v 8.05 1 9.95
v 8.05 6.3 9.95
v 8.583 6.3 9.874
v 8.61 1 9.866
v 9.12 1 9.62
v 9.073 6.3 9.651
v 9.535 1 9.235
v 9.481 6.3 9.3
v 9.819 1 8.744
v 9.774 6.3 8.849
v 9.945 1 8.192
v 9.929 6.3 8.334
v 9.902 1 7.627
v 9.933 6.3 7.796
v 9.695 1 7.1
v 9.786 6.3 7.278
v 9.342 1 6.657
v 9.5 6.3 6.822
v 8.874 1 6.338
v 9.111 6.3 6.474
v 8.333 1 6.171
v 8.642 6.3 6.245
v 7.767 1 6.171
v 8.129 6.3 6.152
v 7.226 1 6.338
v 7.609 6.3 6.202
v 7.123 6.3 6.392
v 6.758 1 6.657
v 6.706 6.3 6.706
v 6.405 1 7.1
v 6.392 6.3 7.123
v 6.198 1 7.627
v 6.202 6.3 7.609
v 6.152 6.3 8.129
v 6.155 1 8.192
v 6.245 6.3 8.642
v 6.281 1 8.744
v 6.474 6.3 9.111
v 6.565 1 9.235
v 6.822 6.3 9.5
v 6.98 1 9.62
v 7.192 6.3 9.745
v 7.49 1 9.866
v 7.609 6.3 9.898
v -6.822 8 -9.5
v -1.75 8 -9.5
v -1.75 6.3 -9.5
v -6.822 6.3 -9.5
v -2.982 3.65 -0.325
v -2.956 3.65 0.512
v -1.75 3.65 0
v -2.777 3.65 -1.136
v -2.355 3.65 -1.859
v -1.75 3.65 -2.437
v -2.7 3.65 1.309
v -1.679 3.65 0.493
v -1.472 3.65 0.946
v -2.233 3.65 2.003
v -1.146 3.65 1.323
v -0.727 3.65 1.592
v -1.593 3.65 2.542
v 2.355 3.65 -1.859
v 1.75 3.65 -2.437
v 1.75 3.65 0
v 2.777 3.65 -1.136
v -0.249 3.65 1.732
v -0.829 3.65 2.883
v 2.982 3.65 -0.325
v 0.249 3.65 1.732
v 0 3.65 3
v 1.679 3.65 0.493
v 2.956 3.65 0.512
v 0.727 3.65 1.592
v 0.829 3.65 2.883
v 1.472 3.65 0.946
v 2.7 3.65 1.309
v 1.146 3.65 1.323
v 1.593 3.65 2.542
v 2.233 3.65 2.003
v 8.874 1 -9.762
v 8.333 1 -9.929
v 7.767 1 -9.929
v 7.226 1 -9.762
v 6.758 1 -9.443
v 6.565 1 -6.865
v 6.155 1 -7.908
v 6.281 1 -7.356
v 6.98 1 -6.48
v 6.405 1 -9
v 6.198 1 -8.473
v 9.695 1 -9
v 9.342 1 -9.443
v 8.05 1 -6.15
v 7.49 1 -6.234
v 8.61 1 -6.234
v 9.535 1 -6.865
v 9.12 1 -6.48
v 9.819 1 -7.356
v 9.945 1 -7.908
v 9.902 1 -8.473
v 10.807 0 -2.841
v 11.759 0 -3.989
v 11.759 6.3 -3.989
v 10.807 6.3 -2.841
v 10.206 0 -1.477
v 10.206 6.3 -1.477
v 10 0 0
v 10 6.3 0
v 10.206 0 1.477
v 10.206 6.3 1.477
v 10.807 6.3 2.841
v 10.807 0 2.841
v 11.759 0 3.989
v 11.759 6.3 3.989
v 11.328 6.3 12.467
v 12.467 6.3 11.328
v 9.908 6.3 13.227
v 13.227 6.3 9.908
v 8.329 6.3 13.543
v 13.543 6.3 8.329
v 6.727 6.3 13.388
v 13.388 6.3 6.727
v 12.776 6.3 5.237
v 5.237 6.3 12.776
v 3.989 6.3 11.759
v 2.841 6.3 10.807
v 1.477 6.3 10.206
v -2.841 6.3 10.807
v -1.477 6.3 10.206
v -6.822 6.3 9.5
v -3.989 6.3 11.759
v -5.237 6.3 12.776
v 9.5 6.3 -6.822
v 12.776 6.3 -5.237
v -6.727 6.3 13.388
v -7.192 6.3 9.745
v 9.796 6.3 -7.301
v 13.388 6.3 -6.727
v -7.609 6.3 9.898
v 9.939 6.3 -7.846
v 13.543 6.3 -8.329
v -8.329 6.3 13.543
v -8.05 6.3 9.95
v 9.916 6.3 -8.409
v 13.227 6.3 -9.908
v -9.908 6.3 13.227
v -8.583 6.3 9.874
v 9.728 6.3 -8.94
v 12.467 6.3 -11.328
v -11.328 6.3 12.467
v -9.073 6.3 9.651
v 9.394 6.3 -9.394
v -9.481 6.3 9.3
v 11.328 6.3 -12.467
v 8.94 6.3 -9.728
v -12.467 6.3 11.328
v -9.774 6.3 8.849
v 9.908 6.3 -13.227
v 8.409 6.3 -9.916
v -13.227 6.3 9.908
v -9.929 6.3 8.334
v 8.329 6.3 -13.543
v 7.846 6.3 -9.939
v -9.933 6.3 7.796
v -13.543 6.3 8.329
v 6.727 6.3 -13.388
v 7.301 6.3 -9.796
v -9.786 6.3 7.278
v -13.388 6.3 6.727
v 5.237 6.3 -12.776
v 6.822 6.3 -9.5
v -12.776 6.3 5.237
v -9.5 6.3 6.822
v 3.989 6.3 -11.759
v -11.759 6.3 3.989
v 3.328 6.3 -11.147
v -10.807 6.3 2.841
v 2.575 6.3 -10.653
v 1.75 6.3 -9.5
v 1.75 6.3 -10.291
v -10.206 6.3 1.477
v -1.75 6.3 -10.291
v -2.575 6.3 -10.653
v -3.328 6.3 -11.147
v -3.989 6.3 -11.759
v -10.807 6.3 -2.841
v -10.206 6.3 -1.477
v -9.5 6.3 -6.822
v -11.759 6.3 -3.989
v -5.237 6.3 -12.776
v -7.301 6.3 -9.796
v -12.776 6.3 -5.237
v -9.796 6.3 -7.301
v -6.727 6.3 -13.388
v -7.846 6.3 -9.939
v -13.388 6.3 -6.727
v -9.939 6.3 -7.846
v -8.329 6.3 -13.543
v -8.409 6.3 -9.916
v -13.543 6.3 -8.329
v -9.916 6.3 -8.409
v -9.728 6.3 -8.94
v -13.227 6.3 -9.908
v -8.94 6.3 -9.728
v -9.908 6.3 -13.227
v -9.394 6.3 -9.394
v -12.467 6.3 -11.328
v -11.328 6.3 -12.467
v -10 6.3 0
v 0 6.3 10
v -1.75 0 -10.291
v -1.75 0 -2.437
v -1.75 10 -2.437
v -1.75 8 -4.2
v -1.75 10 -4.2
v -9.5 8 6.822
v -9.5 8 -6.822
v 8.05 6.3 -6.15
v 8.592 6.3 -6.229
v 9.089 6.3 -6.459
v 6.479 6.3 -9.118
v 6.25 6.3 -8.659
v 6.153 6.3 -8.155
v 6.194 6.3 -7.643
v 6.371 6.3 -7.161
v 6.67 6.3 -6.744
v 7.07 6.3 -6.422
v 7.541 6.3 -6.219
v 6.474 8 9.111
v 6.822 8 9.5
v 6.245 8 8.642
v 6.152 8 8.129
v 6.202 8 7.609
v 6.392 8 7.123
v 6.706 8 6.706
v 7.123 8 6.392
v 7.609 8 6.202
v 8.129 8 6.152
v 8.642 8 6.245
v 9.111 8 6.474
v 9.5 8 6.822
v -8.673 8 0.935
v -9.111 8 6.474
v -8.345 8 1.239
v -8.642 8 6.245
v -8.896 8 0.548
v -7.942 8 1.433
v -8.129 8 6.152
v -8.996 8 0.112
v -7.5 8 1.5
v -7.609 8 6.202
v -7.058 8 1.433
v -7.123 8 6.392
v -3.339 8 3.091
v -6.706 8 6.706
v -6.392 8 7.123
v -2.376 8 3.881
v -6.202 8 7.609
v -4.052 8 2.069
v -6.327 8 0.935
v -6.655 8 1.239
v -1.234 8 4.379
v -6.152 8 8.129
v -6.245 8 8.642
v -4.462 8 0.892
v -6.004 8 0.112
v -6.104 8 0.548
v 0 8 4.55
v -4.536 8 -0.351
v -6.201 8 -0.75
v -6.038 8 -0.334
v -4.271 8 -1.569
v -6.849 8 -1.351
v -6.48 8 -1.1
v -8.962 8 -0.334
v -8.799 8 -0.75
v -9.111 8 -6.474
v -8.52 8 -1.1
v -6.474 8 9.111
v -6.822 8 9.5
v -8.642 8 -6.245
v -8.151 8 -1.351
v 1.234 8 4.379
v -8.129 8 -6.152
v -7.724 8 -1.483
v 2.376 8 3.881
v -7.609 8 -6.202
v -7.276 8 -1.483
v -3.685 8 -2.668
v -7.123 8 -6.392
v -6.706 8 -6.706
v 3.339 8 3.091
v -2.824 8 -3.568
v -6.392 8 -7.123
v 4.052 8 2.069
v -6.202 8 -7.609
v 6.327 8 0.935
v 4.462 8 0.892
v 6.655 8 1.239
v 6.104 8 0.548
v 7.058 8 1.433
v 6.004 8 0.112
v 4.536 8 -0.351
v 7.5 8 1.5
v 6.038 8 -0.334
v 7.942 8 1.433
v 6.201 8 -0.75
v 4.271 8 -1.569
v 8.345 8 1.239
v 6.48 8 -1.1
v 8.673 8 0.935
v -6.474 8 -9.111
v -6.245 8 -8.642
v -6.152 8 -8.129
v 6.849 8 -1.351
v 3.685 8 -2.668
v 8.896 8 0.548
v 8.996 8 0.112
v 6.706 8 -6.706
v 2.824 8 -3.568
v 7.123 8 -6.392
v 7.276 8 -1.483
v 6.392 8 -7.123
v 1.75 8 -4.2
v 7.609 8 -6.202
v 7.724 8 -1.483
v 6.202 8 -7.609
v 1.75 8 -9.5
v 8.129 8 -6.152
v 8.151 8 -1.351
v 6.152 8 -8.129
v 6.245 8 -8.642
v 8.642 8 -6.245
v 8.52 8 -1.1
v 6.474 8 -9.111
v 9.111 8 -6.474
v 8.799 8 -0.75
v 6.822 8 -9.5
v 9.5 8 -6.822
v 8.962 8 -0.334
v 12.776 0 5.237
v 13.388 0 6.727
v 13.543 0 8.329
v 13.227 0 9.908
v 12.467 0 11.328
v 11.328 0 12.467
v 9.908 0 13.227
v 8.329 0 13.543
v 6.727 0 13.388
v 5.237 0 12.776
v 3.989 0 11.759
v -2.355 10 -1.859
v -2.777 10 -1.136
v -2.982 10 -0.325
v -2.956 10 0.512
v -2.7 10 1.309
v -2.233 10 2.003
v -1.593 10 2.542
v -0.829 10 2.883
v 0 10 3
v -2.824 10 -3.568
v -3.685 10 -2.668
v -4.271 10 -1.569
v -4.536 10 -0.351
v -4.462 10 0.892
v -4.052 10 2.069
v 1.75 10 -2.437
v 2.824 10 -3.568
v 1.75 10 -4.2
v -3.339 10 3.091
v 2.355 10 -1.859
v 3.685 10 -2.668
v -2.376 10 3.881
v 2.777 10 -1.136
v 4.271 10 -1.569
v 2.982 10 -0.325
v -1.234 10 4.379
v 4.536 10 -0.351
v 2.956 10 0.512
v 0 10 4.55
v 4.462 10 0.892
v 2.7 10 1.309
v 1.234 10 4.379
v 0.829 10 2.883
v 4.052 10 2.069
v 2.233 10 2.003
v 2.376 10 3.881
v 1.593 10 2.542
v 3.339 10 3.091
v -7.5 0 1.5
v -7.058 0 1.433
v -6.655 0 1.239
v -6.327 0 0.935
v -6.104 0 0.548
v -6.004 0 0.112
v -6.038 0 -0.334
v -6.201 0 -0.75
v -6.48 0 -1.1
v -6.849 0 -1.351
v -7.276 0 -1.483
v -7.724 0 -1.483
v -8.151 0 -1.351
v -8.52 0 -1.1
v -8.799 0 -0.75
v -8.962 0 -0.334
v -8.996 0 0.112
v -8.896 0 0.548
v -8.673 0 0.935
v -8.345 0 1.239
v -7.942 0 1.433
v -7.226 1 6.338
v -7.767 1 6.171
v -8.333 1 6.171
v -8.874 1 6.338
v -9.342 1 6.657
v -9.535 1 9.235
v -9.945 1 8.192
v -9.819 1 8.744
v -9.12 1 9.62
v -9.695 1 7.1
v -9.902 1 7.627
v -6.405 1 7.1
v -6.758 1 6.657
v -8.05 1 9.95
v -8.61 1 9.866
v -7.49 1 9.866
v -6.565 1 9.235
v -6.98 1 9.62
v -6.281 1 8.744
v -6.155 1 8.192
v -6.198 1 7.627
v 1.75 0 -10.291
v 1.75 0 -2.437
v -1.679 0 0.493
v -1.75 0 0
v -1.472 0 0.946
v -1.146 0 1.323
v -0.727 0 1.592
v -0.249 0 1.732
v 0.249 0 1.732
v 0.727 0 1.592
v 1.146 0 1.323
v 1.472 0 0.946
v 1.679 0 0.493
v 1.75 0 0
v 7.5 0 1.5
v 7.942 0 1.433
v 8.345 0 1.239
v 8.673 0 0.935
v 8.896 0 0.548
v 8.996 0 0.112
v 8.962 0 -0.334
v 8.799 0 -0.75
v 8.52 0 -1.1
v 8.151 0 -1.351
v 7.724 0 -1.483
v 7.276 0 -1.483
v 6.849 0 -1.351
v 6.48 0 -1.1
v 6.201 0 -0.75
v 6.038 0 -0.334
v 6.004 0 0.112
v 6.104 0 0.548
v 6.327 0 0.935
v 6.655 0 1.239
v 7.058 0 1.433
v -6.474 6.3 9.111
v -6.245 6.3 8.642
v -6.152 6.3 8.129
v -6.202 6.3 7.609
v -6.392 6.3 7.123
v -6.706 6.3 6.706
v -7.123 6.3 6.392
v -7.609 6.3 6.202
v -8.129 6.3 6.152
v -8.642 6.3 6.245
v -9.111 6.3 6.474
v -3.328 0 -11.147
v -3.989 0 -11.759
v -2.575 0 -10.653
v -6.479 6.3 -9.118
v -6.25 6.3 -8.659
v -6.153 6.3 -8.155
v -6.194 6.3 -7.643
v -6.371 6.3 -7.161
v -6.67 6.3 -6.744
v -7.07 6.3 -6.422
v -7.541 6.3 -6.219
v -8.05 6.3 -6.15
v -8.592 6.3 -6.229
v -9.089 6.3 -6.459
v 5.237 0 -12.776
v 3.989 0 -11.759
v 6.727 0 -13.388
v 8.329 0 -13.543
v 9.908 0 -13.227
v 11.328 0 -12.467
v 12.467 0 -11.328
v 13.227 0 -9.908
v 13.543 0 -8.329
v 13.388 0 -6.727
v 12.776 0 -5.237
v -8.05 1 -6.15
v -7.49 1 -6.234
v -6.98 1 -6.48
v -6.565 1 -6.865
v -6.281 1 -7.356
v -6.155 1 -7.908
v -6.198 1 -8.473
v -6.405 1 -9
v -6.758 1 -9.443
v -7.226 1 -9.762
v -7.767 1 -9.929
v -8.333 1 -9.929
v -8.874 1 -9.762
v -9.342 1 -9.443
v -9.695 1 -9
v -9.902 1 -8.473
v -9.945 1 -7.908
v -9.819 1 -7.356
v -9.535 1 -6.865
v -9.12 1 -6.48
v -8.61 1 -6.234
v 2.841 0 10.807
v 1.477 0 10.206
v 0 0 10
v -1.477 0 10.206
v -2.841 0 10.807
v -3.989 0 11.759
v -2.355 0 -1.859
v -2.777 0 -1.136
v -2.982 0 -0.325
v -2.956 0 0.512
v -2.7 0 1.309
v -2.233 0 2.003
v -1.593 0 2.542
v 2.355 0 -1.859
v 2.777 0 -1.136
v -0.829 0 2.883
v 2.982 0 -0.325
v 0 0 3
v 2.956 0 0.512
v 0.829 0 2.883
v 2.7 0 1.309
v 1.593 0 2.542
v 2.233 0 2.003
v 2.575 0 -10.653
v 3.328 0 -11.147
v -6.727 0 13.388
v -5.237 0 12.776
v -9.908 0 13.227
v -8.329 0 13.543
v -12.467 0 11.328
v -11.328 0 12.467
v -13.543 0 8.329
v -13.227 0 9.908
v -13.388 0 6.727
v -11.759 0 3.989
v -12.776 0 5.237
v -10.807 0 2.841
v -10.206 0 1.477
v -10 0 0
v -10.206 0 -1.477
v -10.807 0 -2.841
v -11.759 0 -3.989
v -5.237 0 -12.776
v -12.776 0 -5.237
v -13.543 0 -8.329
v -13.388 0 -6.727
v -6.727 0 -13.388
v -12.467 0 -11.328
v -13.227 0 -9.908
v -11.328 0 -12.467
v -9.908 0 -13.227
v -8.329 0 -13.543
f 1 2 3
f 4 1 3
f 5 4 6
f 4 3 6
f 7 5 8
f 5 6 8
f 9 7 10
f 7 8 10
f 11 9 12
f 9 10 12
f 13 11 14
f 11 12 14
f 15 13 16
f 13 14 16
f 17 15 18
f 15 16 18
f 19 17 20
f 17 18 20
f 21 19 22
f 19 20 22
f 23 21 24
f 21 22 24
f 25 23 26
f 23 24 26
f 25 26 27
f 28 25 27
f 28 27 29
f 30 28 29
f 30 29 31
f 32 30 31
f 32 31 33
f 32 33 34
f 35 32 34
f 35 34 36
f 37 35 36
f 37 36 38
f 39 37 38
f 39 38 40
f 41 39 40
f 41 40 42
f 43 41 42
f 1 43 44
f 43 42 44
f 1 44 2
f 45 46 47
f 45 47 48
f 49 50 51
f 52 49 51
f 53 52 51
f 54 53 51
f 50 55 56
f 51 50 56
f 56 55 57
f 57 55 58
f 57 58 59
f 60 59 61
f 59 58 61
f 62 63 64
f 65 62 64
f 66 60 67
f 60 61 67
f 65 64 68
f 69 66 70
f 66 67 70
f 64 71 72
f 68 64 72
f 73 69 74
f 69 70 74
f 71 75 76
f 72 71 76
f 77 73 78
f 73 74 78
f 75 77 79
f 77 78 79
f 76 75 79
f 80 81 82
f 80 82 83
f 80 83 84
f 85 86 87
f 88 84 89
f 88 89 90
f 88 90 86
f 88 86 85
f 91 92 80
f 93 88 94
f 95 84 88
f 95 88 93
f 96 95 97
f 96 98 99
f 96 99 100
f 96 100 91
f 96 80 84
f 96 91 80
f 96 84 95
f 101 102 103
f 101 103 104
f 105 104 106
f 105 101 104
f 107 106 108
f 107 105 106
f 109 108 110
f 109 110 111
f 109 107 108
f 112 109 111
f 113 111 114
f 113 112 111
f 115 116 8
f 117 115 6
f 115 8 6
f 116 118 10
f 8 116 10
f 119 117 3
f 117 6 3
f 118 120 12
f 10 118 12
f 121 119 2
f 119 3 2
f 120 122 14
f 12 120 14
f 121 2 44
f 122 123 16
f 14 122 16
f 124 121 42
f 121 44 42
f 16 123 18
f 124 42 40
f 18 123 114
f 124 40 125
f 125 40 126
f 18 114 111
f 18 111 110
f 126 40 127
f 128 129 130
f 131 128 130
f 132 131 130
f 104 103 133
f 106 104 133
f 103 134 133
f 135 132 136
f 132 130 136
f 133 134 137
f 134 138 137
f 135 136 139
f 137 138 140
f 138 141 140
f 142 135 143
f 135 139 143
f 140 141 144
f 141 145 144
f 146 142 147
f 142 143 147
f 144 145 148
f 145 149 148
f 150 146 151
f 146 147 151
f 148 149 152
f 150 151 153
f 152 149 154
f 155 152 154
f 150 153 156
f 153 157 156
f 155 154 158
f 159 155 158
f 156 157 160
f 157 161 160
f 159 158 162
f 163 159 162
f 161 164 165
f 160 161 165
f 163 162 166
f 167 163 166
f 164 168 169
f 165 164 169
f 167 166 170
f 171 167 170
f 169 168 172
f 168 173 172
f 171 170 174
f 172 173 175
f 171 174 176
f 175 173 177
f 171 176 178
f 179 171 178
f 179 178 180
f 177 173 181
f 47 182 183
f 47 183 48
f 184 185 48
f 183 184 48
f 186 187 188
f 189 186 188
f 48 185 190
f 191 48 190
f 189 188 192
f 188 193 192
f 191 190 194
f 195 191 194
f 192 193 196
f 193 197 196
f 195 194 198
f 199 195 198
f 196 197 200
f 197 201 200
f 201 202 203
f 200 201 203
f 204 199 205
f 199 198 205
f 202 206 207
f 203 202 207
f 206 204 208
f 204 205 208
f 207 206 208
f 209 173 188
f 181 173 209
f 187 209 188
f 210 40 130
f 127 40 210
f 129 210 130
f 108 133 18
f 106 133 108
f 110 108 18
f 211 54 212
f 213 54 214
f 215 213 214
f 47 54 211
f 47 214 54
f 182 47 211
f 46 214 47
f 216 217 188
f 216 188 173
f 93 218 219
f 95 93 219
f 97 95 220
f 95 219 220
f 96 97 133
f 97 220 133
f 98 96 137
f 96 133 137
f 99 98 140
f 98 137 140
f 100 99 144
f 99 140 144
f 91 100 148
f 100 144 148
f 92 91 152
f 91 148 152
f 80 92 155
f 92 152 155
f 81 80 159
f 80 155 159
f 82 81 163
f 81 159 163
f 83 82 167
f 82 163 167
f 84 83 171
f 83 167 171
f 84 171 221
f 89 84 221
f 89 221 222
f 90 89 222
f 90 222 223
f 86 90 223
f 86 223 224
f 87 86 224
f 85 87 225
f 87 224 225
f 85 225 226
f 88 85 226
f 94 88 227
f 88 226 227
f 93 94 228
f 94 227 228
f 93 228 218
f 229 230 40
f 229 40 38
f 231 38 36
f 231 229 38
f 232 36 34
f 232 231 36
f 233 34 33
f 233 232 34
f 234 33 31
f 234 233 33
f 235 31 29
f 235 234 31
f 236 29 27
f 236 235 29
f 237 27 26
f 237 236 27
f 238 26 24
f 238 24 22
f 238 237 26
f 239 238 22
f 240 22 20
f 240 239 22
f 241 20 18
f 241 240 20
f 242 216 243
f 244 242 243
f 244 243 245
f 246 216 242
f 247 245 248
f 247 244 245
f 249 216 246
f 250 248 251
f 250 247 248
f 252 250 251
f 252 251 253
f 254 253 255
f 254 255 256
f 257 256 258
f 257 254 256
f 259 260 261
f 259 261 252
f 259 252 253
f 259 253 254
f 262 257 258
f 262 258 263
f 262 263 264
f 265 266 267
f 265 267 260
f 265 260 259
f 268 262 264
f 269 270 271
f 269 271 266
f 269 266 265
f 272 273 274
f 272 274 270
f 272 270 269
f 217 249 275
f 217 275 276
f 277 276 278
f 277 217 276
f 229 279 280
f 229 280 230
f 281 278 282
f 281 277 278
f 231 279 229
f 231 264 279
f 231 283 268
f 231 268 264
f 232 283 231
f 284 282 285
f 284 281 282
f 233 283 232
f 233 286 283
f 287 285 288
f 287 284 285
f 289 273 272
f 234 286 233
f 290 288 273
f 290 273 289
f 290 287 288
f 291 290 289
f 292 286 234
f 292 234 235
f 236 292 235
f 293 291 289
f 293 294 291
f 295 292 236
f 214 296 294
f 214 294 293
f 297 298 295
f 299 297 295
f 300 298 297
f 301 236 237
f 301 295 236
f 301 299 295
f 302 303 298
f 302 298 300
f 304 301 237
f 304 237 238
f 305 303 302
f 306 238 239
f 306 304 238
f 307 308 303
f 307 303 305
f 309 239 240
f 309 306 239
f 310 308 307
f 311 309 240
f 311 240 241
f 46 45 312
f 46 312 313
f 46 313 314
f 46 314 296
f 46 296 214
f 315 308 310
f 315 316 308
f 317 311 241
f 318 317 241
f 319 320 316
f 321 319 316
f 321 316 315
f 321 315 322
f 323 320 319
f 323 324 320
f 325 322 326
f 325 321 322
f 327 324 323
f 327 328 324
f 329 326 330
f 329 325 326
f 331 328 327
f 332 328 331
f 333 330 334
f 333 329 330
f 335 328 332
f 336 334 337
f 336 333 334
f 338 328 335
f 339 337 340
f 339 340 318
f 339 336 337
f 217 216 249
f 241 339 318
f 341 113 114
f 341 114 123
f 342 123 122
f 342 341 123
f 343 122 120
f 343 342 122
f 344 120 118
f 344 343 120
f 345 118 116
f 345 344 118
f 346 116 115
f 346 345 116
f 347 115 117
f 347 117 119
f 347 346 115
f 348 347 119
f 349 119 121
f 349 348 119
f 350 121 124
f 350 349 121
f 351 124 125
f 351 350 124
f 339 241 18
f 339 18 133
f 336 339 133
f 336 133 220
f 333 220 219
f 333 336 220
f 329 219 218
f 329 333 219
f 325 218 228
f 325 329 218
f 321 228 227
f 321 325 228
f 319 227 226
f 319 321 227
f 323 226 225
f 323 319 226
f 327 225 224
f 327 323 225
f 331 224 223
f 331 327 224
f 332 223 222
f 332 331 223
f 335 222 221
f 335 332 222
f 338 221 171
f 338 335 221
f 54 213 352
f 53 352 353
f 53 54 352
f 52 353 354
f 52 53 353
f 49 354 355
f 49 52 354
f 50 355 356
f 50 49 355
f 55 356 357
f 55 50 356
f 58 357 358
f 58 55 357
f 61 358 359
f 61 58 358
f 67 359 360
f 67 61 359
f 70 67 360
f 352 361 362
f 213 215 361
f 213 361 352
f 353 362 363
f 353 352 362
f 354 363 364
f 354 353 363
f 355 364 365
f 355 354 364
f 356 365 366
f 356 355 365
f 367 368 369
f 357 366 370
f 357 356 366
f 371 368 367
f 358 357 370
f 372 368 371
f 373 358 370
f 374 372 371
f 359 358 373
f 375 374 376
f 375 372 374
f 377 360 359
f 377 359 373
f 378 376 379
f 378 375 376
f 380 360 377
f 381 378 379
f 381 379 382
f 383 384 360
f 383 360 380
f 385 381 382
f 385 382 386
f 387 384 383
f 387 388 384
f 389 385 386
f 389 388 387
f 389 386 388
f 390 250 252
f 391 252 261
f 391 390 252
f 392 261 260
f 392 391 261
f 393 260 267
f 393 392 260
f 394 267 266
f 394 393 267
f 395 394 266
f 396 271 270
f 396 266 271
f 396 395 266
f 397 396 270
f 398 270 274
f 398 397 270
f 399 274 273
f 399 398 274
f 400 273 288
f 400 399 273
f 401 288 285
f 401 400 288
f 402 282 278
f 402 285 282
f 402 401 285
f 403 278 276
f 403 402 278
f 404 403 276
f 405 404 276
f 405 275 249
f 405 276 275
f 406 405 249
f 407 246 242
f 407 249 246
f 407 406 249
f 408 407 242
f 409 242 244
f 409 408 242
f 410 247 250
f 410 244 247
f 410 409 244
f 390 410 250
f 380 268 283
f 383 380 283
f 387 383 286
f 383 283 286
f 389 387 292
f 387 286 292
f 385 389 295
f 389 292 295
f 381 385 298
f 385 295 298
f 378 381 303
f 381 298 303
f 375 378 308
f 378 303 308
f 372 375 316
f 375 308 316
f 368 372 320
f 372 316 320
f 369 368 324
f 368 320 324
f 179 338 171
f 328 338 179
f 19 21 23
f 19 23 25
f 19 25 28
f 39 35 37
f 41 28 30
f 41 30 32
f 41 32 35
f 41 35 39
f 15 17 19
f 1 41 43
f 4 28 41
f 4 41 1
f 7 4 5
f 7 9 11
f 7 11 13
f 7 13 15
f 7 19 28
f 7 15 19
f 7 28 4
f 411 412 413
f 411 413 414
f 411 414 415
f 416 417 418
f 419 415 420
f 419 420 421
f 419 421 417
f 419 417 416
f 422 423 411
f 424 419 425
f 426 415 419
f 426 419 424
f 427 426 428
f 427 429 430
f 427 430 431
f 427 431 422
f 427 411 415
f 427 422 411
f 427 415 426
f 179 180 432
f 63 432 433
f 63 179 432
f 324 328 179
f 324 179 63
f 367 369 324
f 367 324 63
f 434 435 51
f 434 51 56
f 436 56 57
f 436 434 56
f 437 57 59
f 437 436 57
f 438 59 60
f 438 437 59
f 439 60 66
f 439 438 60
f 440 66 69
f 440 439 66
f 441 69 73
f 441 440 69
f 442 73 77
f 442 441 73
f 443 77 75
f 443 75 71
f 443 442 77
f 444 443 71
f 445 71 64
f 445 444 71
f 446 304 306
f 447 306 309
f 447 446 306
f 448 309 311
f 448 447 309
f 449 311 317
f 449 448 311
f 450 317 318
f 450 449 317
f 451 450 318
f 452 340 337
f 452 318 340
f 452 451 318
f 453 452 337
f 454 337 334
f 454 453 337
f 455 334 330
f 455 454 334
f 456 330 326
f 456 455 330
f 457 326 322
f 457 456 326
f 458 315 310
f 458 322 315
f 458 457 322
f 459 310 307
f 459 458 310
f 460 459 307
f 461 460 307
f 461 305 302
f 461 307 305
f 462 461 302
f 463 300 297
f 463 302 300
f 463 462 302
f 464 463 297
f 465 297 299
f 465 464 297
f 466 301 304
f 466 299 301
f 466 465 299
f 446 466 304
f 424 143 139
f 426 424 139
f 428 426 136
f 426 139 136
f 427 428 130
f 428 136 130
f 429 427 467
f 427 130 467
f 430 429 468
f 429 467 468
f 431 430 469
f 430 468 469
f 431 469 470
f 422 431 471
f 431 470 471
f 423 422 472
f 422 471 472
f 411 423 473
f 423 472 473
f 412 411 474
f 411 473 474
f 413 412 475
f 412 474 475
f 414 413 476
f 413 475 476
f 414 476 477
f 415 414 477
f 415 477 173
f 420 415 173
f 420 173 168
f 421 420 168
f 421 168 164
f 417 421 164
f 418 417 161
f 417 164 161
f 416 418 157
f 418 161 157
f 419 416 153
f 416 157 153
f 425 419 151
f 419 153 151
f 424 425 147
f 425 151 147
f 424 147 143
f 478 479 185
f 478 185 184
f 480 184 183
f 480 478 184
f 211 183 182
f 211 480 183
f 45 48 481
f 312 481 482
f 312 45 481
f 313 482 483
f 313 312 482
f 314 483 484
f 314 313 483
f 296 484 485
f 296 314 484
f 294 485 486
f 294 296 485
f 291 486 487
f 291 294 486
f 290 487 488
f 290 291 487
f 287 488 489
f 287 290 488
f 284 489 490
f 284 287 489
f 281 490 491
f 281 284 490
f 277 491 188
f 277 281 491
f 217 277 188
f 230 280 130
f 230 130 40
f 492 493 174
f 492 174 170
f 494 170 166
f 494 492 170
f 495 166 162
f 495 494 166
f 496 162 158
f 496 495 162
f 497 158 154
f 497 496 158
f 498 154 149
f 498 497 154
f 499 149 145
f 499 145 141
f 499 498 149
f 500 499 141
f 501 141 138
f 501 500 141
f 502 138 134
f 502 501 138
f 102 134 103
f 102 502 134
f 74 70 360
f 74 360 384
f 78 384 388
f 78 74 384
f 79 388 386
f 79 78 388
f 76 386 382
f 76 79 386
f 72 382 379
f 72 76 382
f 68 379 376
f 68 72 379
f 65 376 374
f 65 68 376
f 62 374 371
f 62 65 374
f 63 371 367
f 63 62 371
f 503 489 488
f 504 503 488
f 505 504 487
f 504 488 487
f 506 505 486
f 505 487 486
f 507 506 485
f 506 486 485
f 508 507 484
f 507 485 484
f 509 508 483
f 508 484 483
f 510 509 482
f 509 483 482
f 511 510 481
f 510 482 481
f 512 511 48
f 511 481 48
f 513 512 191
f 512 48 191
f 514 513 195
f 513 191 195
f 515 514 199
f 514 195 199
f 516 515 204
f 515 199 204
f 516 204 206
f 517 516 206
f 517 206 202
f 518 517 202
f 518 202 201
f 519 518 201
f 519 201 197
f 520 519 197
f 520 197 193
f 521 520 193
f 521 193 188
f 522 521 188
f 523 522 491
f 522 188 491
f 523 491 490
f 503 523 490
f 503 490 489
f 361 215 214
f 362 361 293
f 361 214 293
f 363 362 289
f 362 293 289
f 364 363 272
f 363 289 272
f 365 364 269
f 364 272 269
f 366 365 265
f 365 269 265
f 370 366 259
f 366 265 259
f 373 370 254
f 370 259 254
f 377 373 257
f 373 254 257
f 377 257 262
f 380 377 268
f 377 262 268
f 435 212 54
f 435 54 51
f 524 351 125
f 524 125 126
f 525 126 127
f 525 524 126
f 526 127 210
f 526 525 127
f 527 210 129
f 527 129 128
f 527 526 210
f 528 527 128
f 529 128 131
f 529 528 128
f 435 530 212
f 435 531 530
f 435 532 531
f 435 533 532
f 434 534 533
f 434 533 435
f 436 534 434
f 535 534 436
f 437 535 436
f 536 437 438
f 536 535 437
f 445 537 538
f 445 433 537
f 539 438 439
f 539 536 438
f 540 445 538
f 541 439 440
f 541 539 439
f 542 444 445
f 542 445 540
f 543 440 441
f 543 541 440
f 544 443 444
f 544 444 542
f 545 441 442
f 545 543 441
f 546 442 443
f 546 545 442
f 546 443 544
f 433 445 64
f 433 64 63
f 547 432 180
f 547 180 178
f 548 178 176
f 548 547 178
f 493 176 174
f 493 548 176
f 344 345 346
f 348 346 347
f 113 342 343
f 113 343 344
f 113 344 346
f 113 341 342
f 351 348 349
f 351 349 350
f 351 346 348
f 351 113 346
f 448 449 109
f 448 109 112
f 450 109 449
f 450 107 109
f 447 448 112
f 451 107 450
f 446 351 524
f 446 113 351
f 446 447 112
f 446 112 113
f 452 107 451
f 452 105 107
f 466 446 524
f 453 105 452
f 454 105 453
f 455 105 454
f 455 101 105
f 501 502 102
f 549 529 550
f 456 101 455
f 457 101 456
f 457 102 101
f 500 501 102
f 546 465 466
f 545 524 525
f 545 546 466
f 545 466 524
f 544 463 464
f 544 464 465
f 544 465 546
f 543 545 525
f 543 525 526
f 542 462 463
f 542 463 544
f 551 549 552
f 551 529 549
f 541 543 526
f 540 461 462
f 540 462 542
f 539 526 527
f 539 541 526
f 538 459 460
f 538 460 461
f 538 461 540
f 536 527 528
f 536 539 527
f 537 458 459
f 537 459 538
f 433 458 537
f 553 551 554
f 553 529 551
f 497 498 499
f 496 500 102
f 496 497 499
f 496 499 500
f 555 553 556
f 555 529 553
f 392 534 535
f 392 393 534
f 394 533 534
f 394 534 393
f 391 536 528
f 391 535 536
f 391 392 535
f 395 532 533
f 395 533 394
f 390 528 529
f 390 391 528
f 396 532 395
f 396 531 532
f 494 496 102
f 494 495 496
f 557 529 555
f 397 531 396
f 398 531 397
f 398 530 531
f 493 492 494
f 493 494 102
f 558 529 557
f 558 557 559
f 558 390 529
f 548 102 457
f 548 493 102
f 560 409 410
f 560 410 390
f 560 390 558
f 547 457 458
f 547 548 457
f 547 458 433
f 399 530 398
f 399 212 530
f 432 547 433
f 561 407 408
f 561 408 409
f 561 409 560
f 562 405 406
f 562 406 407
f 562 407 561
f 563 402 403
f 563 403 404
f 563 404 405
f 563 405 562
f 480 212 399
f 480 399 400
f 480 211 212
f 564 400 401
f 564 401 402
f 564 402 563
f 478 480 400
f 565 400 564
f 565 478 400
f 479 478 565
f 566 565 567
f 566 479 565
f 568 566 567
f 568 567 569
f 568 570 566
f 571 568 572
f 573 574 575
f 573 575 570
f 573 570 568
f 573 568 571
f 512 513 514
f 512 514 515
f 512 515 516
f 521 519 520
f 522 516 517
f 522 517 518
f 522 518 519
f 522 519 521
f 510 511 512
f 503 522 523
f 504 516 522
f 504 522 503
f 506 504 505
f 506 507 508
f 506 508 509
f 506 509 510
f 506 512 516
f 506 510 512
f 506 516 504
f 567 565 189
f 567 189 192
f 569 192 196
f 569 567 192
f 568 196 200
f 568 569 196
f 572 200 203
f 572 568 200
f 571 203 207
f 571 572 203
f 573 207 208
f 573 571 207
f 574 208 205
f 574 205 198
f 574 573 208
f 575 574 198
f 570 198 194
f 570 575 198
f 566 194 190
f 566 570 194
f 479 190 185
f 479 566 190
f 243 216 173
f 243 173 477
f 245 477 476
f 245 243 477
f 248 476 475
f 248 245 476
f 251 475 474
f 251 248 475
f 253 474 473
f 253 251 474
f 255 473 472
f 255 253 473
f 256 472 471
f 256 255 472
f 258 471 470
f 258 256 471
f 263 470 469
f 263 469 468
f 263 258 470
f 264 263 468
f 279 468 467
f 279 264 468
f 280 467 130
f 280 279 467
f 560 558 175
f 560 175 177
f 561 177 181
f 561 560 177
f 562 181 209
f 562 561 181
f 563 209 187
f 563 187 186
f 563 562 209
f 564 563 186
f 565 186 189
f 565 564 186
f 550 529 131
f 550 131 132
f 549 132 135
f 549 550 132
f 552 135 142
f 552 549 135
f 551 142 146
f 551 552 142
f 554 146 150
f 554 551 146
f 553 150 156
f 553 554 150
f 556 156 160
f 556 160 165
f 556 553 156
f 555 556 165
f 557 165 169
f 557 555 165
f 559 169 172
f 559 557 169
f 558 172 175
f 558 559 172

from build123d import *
from build123d.topology import SkipClean

# Parameters (mm, degrees)
SKETCH1_R           = 1.5
BOSS_EXTRUDE1_DEPTH = 6.3
SKETCH3_R           = 1.9
CUT_EXTRUDE3_DEPTH  = 5.3
BOSS_EXTRUDE2_START = 1.7
BOSS_EXTRUDE2_DEPTH = 1.7
SKETCH7_R           = 4.55
BOSS_EXTRUDE3_DEPTH = 2
SKETCH6_R           = 1.5
SKETCH6_R_2         = 3
CUT_EXTRUDE4_DEPTH  = 22.614925399
CUT_EXTRUDE5_DEPTH  = 22.614925399
BOSS_EXTRUDE4_DEPTH = 3.65


with BuildPart() as part:
    # Sketch1 → Boss-Extrude1 (new body)
    with BuildSketch(Plane(origin=(0, 0, 0), x_dir=(1, 0, 0), z_dir=(0, 1, 0))):
        with BuildLine():
            ThreePointArc((-3.988860539, -11.759062722), (-11.939087297, -11.939087297), (-11.759062722, -3.988860539))
            ThreePointArc((-11.759062722, -3.988860539), (-10, 0), (-11.759062722, 3.988860539))
            ThreePointArc((-11.759062722, 3.988860539), (-11.939087297, 11.939087297), (-3.988860539, 11.759062722))
            ThreePointArc((-3.988860539, 11.759062722), (0, 10), (3.988860539, 11.759062722))
            ThreePointArc((3.988860539, 11.759062722), (11.939087297, 11.939087297), (11.759062722, 3.988860539))
            ThreePointArc((11.759062722, 3.988860539), (10, 0), (11.759062722, -3.988860539))
            ThreePointArc((11.759062722, -3.988860539), (11.939087297, -11.939087297), (3.988860539, -11.759062722))
            ThreePointArc((3.988860539, -11.759062722), (0, -10), (-3.988860539, -11.759062722))
        make_face()
        with Locations(Location((-7.5, 0, 0), (0, 0, 270))):
            Circle(SKETCH1_R, mode=Mode.SUBTRACT)
        with Locations(Location((7.5, 0, 0), (0, 0, 270))):
            Circle(SKETCH1_R, mode=Mode.SUBTRACT)
    extrude(amount=BOSS_EXTRUDE1_DEPTH)

    # Sketch3 → Cut-Extrude3 (cut)
    with BuildSketch(Plane(origin=(0, 6.3, 0), x_dir=(1, 0, 0), z_dir=(0, 1, 0))):
        with Locations(Location((-8.05, 8.05, 0), (0, 0, 270))):
            Circle(SKETCH3_R)
        with Locations(Location((8.05, 8.05, 0), (0, 0, 270))):
            Circle(SKETCH3_R)
        with Locations(Location((8.05, -8.05, 0), (0, 0, 270))):
            Circle(SKETCH3_R)
        with Locations(Location((-8.05, -8.05, 0), (0, 0, 270))):
            Circle(SKETCH3_R)
    extrude(amount=-CUT_EXTRUDE3_DEPTH, mode=Mode.SUBTRACT)

    # Sketch5 → Boss-Extrude2 (add)
    with BuildSketch(Plane(origin=(0, 6.3, 0), x_dir=(1, 0, 0), z_dir=(0, 1, 0)).offset(BOSS_EXTRUDE2_START)):
        with BuildLine():
            Line((-9.5, 6.822197084), (-9.5, -6.822197084))
            ThreePointArc((-9.5, -6.822197084), (-6.706497116, -6.706497116), (-6.822197084, -9.5))
            Line((-6.822197084, -9.5), (6.822197084, -9.5))
            ThreePointArc((6.822197084, -9.5), (6.706497116, -6.706497116), (9.5, -6.822197084))
            Line((9.5, -6.822197084), (9.5, 6.822197084))
            ThreePointArc((9.5, 6.822197084), (6.706497116, 6.706497116), (6.822197084, 9.5))
            Line((6.822197084, 9.5), (-6.822197084, 9.5))
            ThreePointArc((-6.822197084, 9.5), (-6.706497116, 6.706497116), (-9.5, 6.822197084))
        make_face()
    extrude(amount=-BOSS_EXTRUDE2_DEPTH)

    # Sketch7 → Boss-Extrude3 (add)
    with BuildSketch(Plane(origin=(0, 8, 0), x_dir=(1, 0, 0), z_dir=(0, 1, 0))):
        with Locations(Location((0, 0, 0), (0, 0, 270))):
            Circle(SKETCH7_R)
    extrude(amount=BOSS_EXTRUDE3_DEPTH)

    # Sketch6 → Cut-Extrude4 (cut, through all)
    with BuildSketch(Plane(origin=(0, 0, 0), x_dir=(1, 0, 0), z_dir=(0, 1, 0))):
        with Locations(Location((-7.5, 0, 0), (0, 0, 270))):
            Circle(SKETCH6_R)
        with Locations(Location((0, 0, 0), (0, 0, 270))):
            Circle(SKETCH6_R_2)
        with Locations(Location((7.5, 0, 0), (0, 0, 270))):
            Circle(SKETCH6_R)
    extrude(amount=CUT_EXTRUDE4_DEPTH, mode=Mode.SUBTRACT)

    # Sketch8 → Cut-Extrude5 (cut, through all)
    with SkipClean():  # the faces are left unmerged after this step: merging them gives an invalid solid
        with BuildSketch(Plane(origin=(0, 10, 0), x_dir=(1, 0, 0), z_dir=(0, 1, 0))):
            with BuildLine():
                Line((-1.75, 0), (-1.75, 12))
                ThreePointArc((-1.75, 12), (0, 13.75), (1.75, 12))
                Line((1.75, 12), (1.75, 0))
                ThreePointArc((1.75, 0), (0, -1.75), (-1.75, 0))
            make_face()
        extrude(amount=-CUT_EXTRUDE5_DEPTH, mode=Mode.SUBTRACT)

    # Sketch9 → Boss-Extrude4 (add)
    with SkipClean():  # the faces are left unmerged after this step: merging them gives an invalid solid
        with BuildSketch(Plane.XZ):
            with BuildLine():
                Line((-1.75, -2.436698586), (-1.75, 0))
                ThreePointArc((-1.75, 0), (0, 1.75), (1.75, 0))
                Line((1.75, 0), (1.75, -2.436698586))
                ThreePointArc((1.75, -2.436698586), (0, 3), (-1.75, -2.436698586))
            make_face()
        extrude(amount=-BOSS_EXTRUDE4_DEPTH)


solid = part.part
